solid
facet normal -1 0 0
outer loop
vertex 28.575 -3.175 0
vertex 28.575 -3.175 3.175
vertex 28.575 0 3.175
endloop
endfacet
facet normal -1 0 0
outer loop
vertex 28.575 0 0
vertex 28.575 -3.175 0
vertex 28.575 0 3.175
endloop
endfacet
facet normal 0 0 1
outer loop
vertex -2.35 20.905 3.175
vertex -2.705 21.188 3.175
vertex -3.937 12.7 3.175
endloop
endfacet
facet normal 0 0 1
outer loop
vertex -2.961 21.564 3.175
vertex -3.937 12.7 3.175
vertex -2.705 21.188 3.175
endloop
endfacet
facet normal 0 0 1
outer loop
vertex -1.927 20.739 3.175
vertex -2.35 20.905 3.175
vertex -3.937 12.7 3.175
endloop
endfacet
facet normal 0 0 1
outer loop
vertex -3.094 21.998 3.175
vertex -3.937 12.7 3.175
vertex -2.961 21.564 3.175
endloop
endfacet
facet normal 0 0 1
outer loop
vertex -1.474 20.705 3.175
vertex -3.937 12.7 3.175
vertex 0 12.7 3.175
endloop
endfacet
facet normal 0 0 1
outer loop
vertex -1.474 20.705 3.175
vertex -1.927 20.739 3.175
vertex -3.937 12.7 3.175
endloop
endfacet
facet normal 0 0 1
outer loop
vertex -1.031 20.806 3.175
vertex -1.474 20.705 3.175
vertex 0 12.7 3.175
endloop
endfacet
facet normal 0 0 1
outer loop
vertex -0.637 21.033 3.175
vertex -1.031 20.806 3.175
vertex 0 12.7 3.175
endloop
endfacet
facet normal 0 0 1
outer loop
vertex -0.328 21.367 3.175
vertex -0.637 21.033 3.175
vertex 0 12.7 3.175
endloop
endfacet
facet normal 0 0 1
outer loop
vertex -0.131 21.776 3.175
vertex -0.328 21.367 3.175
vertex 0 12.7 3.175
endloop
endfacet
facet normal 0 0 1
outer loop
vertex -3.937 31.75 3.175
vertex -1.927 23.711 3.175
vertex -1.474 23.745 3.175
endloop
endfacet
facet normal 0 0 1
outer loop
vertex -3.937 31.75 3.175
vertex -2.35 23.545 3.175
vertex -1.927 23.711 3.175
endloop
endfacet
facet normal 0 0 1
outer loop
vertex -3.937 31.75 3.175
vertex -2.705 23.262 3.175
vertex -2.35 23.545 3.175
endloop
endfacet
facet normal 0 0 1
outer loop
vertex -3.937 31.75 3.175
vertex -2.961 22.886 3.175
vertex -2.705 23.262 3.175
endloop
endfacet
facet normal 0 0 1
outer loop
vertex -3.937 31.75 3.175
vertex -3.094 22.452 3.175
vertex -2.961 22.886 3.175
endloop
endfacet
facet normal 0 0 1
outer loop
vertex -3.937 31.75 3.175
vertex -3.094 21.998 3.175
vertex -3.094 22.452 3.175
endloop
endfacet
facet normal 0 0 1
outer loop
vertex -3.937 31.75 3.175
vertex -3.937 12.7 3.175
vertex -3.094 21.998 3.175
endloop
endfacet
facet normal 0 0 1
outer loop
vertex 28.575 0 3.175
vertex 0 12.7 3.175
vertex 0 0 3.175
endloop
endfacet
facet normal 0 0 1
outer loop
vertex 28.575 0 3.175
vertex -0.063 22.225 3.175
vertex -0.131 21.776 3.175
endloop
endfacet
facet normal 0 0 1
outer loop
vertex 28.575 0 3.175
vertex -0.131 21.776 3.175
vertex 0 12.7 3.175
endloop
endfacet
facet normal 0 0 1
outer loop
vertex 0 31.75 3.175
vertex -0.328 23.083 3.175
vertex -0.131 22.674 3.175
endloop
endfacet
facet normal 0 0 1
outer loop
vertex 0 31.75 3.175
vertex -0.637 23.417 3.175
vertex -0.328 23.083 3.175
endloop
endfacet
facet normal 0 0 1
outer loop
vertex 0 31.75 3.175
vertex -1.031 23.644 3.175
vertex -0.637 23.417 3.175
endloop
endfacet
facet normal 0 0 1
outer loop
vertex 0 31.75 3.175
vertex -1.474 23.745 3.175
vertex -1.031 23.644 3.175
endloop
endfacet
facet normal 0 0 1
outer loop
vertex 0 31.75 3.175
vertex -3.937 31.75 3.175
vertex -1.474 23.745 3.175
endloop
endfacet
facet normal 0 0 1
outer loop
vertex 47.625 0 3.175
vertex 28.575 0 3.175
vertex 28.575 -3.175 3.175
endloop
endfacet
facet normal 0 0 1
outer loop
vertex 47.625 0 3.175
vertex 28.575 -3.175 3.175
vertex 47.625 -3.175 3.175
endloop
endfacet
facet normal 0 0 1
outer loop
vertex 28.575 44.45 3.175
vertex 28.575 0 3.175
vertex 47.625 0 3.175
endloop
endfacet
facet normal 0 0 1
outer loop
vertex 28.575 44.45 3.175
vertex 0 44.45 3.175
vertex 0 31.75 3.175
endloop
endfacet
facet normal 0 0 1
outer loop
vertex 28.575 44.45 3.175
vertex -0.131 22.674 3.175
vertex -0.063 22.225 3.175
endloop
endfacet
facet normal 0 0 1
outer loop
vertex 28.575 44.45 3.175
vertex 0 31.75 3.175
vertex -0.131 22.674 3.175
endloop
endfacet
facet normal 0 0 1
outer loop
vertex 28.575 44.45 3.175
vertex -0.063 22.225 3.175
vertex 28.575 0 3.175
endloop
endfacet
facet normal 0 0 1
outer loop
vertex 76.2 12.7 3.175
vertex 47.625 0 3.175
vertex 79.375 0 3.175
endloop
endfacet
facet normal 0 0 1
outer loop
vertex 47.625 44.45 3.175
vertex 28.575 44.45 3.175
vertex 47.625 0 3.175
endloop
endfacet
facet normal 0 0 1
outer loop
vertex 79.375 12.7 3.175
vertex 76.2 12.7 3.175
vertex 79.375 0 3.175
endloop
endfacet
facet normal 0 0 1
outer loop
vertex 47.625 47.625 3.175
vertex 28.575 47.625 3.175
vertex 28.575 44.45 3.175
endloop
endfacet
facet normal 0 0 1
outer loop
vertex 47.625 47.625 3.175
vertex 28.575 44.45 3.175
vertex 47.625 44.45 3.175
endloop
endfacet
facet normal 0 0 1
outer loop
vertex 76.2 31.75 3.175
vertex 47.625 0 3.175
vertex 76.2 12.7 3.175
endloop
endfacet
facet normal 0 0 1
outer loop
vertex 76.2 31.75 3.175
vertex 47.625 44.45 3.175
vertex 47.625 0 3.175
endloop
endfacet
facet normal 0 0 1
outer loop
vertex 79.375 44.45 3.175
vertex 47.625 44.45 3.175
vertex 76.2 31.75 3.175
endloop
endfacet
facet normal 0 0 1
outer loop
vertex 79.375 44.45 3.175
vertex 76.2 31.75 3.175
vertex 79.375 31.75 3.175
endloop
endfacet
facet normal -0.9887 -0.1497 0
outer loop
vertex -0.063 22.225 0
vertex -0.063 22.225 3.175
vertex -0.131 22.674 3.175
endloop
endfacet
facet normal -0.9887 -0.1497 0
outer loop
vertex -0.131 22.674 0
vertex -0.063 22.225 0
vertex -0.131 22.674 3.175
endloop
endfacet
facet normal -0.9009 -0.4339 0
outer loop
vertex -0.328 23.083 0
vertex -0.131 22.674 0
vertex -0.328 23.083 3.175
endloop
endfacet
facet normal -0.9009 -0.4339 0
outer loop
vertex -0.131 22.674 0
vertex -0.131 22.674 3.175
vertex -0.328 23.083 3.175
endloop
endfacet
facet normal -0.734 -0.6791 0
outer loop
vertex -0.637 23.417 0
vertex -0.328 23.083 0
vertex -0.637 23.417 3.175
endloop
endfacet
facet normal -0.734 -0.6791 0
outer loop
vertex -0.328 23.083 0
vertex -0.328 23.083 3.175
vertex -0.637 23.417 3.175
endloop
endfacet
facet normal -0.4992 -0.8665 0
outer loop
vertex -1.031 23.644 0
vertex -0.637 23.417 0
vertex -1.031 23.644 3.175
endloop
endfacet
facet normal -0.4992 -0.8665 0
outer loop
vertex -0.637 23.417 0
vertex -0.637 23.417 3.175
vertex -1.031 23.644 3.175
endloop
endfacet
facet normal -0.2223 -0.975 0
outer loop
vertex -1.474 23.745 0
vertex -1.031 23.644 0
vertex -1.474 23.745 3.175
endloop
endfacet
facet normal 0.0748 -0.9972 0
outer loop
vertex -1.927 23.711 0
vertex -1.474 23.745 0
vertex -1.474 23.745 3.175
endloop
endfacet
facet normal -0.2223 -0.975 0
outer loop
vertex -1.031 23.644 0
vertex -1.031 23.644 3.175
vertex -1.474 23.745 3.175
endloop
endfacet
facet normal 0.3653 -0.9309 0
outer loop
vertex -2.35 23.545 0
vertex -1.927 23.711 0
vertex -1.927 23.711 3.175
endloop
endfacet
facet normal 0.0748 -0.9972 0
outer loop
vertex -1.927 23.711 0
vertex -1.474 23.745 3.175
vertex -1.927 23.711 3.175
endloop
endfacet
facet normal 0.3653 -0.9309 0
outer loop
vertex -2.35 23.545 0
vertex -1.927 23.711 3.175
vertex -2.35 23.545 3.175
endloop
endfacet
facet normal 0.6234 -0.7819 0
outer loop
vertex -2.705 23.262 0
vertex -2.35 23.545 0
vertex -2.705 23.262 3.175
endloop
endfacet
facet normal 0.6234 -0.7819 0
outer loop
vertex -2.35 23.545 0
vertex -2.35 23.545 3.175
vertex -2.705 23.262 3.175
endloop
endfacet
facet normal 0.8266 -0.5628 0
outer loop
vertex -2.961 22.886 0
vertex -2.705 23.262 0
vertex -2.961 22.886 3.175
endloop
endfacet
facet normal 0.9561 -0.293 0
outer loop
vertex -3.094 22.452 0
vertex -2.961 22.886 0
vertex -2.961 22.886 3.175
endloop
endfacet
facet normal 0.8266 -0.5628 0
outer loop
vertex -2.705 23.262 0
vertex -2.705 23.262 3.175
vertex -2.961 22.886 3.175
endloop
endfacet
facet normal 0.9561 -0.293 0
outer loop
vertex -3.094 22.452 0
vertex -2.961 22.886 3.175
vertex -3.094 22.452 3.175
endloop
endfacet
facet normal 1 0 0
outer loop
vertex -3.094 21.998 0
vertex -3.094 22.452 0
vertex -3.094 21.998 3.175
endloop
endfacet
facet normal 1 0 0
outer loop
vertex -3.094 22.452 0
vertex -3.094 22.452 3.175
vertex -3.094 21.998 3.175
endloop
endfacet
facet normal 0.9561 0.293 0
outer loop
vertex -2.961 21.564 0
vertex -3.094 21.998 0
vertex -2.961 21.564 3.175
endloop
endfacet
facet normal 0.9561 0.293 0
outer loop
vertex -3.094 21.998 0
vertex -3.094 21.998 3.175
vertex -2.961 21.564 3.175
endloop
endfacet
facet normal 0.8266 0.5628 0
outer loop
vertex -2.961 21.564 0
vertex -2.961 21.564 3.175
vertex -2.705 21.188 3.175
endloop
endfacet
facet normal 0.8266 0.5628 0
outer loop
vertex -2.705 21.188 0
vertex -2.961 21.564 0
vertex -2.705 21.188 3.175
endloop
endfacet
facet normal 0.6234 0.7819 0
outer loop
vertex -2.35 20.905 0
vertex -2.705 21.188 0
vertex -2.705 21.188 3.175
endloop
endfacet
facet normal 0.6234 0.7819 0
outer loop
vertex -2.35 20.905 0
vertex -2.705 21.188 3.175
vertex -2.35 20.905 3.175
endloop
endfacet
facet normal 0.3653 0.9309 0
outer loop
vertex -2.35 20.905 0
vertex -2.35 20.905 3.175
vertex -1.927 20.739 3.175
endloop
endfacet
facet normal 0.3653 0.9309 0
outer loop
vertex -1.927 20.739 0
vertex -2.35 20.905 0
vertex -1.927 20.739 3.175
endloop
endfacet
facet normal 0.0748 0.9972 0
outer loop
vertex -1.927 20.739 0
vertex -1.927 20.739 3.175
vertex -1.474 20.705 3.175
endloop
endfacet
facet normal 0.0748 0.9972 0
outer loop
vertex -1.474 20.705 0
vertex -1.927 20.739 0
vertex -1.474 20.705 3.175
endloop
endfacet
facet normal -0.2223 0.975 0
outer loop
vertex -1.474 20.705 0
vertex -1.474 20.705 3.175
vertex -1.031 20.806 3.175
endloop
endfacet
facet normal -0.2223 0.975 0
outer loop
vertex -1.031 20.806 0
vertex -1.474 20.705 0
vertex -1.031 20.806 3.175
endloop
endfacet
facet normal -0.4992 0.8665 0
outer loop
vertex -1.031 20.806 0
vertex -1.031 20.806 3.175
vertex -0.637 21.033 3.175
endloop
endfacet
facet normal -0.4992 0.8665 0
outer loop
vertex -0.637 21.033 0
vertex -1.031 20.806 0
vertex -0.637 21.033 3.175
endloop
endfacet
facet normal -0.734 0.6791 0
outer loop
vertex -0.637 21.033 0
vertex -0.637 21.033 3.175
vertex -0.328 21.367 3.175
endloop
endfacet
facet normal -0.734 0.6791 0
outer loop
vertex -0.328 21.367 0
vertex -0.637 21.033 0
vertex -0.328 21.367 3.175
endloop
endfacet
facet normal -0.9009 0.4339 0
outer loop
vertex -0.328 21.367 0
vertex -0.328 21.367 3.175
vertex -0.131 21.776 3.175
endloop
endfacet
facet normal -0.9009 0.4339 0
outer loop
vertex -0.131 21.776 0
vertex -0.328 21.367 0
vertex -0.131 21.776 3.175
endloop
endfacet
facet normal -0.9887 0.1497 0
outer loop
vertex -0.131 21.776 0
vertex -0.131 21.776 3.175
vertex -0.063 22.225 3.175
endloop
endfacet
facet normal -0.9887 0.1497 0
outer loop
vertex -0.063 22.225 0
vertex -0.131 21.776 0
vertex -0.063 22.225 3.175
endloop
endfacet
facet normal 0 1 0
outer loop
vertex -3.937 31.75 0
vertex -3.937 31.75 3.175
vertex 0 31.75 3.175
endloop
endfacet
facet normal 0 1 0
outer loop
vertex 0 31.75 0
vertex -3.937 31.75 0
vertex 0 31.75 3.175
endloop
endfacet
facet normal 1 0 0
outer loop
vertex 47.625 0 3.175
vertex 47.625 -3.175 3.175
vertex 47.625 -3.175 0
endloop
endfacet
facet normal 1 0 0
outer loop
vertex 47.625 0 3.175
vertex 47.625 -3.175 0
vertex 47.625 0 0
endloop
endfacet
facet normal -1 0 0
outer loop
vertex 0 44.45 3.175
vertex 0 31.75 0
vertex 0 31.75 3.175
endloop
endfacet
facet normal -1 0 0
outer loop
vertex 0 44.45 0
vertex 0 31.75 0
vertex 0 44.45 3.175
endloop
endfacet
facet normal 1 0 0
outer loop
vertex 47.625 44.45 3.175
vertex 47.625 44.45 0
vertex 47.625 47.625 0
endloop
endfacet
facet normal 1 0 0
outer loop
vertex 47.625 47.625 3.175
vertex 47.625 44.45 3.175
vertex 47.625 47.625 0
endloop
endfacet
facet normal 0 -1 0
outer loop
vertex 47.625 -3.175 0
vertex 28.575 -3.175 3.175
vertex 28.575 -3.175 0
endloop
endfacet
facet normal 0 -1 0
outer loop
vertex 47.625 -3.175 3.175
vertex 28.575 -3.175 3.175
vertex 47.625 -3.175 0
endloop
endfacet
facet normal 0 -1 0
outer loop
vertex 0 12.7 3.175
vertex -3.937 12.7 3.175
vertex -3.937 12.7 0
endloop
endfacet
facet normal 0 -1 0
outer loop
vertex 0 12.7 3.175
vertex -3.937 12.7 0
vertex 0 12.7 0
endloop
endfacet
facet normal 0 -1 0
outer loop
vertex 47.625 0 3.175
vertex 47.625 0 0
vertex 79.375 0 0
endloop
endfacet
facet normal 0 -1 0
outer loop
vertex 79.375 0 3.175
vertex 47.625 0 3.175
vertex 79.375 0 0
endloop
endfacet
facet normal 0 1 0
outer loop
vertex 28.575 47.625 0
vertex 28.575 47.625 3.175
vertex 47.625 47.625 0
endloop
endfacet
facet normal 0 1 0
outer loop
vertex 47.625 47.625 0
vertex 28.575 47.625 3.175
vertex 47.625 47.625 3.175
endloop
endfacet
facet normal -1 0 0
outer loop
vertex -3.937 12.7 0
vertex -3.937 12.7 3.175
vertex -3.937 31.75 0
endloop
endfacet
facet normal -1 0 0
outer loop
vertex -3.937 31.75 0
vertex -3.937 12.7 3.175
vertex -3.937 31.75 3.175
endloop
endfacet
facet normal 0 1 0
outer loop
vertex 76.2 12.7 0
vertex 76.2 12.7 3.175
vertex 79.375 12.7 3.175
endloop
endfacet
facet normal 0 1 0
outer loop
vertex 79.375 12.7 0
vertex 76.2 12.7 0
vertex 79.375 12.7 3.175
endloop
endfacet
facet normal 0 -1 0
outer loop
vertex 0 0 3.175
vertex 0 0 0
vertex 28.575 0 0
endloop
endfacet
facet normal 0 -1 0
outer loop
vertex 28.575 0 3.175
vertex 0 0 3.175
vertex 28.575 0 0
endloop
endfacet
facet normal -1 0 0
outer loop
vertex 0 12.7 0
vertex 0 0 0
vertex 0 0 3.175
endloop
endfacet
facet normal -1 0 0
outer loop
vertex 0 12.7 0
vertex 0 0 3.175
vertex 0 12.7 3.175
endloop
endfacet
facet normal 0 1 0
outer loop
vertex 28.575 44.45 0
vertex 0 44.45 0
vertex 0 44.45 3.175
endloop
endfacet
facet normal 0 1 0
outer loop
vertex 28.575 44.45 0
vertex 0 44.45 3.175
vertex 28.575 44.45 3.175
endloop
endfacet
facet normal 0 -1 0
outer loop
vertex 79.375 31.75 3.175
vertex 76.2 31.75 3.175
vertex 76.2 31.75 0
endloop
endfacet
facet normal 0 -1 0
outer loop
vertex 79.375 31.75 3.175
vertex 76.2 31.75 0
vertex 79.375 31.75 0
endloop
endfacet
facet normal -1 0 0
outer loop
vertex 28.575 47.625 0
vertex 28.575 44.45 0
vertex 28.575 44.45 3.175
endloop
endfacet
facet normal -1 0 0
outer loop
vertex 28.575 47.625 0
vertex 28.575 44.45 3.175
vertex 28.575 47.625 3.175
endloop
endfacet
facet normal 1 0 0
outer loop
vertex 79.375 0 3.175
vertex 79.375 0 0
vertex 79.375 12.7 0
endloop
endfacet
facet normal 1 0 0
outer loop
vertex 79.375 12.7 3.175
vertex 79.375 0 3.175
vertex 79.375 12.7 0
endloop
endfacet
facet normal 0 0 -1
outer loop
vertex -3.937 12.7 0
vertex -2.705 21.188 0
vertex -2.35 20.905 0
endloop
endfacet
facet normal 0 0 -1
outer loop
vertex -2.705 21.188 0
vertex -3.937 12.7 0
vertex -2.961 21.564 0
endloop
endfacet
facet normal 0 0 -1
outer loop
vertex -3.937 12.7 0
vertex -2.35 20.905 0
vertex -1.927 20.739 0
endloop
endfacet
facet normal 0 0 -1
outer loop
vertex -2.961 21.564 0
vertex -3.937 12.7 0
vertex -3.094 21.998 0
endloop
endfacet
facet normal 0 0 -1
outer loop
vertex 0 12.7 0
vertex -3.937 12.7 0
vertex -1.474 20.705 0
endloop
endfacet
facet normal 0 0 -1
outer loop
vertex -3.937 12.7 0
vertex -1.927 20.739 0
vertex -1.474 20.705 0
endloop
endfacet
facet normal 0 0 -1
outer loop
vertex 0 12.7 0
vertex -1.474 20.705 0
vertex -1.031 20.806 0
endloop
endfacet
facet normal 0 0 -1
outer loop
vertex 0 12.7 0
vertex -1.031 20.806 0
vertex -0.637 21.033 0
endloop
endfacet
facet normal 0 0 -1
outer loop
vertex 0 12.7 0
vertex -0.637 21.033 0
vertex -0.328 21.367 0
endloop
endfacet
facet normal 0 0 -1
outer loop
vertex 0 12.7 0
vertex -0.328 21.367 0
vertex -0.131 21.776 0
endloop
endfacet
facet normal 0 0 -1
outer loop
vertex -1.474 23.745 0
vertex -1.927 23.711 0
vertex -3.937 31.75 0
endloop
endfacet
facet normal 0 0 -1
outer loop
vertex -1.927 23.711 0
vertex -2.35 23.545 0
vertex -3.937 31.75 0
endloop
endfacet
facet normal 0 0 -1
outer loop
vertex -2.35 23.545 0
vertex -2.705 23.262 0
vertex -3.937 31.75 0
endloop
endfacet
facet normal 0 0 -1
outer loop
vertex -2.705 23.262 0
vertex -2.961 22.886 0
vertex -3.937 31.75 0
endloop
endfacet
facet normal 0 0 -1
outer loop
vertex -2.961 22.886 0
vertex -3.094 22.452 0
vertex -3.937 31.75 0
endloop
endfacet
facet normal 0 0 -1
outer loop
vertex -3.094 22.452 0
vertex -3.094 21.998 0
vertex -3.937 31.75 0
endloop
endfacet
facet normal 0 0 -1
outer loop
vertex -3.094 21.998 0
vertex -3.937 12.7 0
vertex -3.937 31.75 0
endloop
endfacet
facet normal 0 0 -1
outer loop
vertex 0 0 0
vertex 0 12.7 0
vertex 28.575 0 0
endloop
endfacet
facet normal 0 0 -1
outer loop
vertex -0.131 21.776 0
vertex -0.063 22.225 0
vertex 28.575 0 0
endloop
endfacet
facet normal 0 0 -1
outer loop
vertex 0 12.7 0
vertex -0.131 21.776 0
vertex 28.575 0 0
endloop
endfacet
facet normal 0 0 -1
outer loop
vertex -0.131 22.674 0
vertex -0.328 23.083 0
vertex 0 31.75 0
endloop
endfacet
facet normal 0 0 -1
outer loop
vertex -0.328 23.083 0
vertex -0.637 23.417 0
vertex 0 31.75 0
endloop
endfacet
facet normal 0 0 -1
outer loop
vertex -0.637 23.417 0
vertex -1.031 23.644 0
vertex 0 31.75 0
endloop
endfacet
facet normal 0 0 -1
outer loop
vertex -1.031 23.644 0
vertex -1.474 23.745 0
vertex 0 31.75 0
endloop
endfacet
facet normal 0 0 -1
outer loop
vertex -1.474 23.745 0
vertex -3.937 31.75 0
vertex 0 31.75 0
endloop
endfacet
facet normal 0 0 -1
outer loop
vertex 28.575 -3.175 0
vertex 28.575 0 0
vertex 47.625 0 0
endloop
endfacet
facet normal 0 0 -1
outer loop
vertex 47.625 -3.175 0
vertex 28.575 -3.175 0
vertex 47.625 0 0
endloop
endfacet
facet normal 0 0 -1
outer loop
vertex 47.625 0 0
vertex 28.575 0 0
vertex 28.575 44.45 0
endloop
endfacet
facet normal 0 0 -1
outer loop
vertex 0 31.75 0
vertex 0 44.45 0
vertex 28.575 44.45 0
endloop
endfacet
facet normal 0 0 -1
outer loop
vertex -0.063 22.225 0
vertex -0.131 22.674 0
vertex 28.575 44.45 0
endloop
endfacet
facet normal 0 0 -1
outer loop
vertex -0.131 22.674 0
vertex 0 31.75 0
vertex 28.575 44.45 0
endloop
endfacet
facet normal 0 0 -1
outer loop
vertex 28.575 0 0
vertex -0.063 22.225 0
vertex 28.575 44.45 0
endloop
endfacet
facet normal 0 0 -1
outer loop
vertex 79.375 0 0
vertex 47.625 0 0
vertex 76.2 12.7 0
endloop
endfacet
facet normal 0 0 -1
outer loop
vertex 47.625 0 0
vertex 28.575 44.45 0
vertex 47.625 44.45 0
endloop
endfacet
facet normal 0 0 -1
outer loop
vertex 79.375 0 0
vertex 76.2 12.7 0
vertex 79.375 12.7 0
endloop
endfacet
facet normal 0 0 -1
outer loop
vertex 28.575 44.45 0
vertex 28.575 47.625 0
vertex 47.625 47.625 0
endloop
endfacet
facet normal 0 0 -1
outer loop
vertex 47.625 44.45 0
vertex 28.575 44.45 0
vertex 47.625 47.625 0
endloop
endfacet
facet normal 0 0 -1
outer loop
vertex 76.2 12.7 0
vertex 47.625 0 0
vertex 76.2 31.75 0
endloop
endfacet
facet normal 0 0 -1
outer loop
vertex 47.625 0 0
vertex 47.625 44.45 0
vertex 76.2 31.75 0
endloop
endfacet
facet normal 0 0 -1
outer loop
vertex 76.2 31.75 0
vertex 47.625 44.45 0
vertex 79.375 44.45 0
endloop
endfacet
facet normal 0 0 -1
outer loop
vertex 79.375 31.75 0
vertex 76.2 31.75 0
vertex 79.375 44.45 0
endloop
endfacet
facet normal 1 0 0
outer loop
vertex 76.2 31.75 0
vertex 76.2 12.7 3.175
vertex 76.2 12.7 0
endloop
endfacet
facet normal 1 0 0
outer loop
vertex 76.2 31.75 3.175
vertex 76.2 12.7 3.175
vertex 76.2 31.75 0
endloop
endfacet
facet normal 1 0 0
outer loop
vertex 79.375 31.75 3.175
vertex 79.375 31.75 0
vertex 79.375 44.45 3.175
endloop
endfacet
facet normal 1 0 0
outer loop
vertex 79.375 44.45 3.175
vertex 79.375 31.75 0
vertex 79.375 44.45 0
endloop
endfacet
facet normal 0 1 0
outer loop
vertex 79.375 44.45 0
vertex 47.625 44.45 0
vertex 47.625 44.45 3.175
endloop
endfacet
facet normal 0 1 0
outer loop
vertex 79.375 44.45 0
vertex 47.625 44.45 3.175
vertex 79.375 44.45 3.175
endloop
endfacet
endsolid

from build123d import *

# Parameters (mm, degrees)
SKETCH1_W           = 79.375
SKETCH1_H           = 44.45
BOSS_EXTRUDE1_DEPTH = 3.175
SKETCH2_W           = 3.175
SKETCH2_H           = 19.05
BOSS_EXTRUDE2_DEPTH = 3.175
SKETCH5_W           = 19.05
SKETCH5_H           = 3.175
BOSS_EXTRUDE3_DEPTH = 3.175
SKETCH3_W           = 3.175
SKETCH3_H           = 19.05
CUT_EXTRUDE1_DEPTH  = 3.175
SKETCH6_W           = 0.762
SKETCH6_H           = 19.05
BOSS_EXTRUDE4_DEPTH = 3.175
SKETCH7_R           = 1.524
CUT_EXTRUDE2_DEPTH  = 93.620796126


with BuildPart() as part:
    # Sketch1 → Boss-Extrude1 (new body)
    with BuildSketch(Plane.XY):
        with Locations((39.6875, 22.225)):
            Rectangle(SKETCH1_W, SKETCH1_H)
    extrude(amount=BOSS_EXTRUDE1_DEPTH)

    # Sketch2 → Boss-Extrude2 (add)
    with BuildSketch(Plane.XY.offset(3.175)):
        with Locations((-1.5875, 22.225)):
            Rectangle(SKETCH2_W, SKETCH2_H)
    extrude(amount=-BOSS_EXTRUDE2_DEPTH)

    # Sketch5 → Boss-Extrude3 (add)
    with BuildSketch(Plane.XY.offset(3.175)):
        with Locations((38.1, 46.0375)):
            Rectangle(SKETCH5_W, SKETCH5_H)
        with Locations((38.1, -1.5875)):
            Rectangle(SKETCH5_W, SKETCH5_H)
    extrude(amount=-BOSS_EXTRUDE3_DEPTH)

    # Sketch3 → Cut-Extrude1 (cut)
    with BuildSketch(Plane.XY.offset(3.175)):
        with Locations((77.7875, 22.225)):
            Rectangle(SKETCH3_W, SKETCH3_H)
    extrude(amount=-CUT_EXTRUDE1_DEPTH, mode=Mode.SUBTRACT)

    # Sketch6 → Boss-Extrude4 (add)
    with BuildSketch(Plane.XY.offset(3.175)):
        with Locations((-3.556, 22.225)):
            Rectangle(SKETCH6_W, SKETCH6_H)
    extrude(amount=-BOSS_EXTRUDE4_DEPTH)

    # Sketch7 → Cut-Extrude2 (cut, through all)
    with BuildSketch(Plane.XY.offset(3.175)):
        with Locations((-1.5875, 22.225)):
            Circle(SKETCH7_R)
    extrude(amount=-CUT_EXTRUDE2_DEPTH, mode=Mode.SUBTRACT)


solid = part.part
